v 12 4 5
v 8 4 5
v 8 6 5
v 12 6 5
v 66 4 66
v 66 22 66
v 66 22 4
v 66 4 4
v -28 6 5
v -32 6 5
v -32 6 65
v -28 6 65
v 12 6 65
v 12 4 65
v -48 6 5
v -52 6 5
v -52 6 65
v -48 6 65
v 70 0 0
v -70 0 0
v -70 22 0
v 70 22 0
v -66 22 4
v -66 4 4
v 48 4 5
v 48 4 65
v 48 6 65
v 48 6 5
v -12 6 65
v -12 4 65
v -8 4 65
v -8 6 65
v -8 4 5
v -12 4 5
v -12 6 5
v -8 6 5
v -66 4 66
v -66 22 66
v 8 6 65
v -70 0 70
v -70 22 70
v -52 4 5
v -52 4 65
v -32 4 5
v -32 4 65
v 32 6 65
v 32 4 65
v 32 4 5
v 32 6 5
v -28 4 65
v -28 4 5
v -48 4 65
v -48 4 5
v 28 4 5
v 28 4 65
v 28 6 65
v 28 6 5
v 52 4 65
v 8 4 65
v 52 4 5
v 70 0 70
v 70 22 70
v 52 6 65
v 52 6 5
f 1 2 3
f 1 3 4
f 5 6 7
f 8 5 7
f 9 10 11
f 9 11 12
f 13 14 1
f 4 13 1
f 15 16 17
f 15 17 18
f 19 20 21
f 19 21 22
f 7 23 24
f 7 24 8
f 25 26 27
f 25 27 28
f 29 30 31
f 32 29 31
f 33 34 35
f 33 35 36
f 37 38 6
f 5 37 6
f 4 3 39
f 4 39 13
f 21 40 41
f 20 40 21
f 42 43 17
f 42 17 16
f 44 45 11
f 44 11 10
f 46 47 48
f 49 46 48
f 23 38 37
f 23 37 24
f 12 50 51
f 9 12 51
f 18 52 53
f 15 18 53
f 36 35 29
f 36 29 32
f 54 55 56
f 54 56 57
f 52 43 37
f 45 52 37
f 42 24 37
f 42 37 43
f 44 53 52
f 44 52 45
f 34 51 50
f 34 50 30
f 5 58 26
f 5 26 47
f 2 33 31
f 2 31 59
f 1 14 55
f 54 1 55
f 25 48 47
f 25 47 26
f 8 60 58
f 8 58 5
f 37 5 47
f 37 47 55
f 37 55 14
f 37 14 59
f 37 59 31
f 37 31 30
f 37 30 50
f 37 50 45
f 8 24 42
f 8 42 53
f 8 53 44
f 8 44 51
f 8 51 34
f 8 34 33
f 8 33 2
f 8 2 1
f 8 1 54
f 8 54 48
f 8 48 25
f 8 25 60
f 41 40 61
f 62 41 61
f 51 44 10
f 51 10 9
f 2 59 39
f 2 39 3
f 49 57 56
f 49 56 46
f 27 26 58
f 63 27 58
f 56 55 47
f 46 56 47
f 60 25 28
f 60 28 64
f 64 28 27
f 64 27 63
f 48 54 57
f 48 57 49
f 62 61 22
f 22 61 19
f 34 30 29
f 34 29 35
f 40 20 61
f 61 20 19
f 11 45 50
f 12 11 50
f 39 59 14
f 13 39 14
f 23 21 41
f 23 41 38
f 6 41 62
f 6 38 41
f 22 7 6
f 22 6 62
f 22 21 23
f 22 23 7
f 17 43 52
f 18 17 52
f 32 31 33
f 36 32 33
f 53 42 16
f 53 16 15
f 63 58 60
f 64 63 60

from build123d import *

# Parameters (mm, degrees)
SKETCH1_W         = 140
SKETCH1_H         = 70
TRAY_DEPTH        = 22
BASIN_START       = 22
SKETCH2_W         = 132
SKETCH2_H         = 62
BASIN_DEPTH       = 18
GRILLE_RIBS_START = 4
SKETCH3_W         = 4
SKETCH3_H         = 60
GRILLE_RIBS_DEPTH = 2


with BuildPart() as part:
    # Sketch1 → Tray (new body)
    with BuildSketch(Plane(origin=(0, 0, 0), x_dir=(1, 0, 0), z_dir=(0, 1, 0))):
        with Locations((0, -35)):
            Rectangle(SKETCH1_W, SKETCH1_H)
    extrude(amount=TRAY_DEPTH)

    # Sketch2 → Basin (cut)
    with BuildSketch(Plane(origin=(0, 0, 0), x_dir=(1, 0, 0), z_dir=(0, 1, 0)).offset(BASIN_START)):
        with Locations((0, -35)):
            Rectangle(SKETCH2_W, SKETCH2_H)
    extrude(amount=-BASIN_DEPTH, mode=Mode.SUBTRACT)

    # Sketch3 → Grille_Ribs (add)
    with BuildSketch(Plane(origin=(0, 0, 0), x_dir=(1, 0, 0), z_dir=(0, 1, 0)).offset(GRILLE_RIBS_START)):
        with Locations((-50, -35)):
            Rectangle(SKETCH3_W, SKETCH3_H)
        with Locations((-30, -35)):
            Rectangle(SKETCH3_W, SKETCH3_H)
        with Locations((-10, -35)):
            Rectangle(SKETCH3_W, SKETCH3_H)
        with Locations((10, -35)):
            Rectangle(SKETCH3_W, SKETCH3_H)
        with Locations((30, -35)):
            Rectangle(SKETCH3_W, SKETCH3_H)
        with Locations((50, -35)):
            Rectangle(SKETCH3_W, SKETCH3_H)
    extrude(amount=GRILLE_RIBS_DEPTH)


solid = part.part
